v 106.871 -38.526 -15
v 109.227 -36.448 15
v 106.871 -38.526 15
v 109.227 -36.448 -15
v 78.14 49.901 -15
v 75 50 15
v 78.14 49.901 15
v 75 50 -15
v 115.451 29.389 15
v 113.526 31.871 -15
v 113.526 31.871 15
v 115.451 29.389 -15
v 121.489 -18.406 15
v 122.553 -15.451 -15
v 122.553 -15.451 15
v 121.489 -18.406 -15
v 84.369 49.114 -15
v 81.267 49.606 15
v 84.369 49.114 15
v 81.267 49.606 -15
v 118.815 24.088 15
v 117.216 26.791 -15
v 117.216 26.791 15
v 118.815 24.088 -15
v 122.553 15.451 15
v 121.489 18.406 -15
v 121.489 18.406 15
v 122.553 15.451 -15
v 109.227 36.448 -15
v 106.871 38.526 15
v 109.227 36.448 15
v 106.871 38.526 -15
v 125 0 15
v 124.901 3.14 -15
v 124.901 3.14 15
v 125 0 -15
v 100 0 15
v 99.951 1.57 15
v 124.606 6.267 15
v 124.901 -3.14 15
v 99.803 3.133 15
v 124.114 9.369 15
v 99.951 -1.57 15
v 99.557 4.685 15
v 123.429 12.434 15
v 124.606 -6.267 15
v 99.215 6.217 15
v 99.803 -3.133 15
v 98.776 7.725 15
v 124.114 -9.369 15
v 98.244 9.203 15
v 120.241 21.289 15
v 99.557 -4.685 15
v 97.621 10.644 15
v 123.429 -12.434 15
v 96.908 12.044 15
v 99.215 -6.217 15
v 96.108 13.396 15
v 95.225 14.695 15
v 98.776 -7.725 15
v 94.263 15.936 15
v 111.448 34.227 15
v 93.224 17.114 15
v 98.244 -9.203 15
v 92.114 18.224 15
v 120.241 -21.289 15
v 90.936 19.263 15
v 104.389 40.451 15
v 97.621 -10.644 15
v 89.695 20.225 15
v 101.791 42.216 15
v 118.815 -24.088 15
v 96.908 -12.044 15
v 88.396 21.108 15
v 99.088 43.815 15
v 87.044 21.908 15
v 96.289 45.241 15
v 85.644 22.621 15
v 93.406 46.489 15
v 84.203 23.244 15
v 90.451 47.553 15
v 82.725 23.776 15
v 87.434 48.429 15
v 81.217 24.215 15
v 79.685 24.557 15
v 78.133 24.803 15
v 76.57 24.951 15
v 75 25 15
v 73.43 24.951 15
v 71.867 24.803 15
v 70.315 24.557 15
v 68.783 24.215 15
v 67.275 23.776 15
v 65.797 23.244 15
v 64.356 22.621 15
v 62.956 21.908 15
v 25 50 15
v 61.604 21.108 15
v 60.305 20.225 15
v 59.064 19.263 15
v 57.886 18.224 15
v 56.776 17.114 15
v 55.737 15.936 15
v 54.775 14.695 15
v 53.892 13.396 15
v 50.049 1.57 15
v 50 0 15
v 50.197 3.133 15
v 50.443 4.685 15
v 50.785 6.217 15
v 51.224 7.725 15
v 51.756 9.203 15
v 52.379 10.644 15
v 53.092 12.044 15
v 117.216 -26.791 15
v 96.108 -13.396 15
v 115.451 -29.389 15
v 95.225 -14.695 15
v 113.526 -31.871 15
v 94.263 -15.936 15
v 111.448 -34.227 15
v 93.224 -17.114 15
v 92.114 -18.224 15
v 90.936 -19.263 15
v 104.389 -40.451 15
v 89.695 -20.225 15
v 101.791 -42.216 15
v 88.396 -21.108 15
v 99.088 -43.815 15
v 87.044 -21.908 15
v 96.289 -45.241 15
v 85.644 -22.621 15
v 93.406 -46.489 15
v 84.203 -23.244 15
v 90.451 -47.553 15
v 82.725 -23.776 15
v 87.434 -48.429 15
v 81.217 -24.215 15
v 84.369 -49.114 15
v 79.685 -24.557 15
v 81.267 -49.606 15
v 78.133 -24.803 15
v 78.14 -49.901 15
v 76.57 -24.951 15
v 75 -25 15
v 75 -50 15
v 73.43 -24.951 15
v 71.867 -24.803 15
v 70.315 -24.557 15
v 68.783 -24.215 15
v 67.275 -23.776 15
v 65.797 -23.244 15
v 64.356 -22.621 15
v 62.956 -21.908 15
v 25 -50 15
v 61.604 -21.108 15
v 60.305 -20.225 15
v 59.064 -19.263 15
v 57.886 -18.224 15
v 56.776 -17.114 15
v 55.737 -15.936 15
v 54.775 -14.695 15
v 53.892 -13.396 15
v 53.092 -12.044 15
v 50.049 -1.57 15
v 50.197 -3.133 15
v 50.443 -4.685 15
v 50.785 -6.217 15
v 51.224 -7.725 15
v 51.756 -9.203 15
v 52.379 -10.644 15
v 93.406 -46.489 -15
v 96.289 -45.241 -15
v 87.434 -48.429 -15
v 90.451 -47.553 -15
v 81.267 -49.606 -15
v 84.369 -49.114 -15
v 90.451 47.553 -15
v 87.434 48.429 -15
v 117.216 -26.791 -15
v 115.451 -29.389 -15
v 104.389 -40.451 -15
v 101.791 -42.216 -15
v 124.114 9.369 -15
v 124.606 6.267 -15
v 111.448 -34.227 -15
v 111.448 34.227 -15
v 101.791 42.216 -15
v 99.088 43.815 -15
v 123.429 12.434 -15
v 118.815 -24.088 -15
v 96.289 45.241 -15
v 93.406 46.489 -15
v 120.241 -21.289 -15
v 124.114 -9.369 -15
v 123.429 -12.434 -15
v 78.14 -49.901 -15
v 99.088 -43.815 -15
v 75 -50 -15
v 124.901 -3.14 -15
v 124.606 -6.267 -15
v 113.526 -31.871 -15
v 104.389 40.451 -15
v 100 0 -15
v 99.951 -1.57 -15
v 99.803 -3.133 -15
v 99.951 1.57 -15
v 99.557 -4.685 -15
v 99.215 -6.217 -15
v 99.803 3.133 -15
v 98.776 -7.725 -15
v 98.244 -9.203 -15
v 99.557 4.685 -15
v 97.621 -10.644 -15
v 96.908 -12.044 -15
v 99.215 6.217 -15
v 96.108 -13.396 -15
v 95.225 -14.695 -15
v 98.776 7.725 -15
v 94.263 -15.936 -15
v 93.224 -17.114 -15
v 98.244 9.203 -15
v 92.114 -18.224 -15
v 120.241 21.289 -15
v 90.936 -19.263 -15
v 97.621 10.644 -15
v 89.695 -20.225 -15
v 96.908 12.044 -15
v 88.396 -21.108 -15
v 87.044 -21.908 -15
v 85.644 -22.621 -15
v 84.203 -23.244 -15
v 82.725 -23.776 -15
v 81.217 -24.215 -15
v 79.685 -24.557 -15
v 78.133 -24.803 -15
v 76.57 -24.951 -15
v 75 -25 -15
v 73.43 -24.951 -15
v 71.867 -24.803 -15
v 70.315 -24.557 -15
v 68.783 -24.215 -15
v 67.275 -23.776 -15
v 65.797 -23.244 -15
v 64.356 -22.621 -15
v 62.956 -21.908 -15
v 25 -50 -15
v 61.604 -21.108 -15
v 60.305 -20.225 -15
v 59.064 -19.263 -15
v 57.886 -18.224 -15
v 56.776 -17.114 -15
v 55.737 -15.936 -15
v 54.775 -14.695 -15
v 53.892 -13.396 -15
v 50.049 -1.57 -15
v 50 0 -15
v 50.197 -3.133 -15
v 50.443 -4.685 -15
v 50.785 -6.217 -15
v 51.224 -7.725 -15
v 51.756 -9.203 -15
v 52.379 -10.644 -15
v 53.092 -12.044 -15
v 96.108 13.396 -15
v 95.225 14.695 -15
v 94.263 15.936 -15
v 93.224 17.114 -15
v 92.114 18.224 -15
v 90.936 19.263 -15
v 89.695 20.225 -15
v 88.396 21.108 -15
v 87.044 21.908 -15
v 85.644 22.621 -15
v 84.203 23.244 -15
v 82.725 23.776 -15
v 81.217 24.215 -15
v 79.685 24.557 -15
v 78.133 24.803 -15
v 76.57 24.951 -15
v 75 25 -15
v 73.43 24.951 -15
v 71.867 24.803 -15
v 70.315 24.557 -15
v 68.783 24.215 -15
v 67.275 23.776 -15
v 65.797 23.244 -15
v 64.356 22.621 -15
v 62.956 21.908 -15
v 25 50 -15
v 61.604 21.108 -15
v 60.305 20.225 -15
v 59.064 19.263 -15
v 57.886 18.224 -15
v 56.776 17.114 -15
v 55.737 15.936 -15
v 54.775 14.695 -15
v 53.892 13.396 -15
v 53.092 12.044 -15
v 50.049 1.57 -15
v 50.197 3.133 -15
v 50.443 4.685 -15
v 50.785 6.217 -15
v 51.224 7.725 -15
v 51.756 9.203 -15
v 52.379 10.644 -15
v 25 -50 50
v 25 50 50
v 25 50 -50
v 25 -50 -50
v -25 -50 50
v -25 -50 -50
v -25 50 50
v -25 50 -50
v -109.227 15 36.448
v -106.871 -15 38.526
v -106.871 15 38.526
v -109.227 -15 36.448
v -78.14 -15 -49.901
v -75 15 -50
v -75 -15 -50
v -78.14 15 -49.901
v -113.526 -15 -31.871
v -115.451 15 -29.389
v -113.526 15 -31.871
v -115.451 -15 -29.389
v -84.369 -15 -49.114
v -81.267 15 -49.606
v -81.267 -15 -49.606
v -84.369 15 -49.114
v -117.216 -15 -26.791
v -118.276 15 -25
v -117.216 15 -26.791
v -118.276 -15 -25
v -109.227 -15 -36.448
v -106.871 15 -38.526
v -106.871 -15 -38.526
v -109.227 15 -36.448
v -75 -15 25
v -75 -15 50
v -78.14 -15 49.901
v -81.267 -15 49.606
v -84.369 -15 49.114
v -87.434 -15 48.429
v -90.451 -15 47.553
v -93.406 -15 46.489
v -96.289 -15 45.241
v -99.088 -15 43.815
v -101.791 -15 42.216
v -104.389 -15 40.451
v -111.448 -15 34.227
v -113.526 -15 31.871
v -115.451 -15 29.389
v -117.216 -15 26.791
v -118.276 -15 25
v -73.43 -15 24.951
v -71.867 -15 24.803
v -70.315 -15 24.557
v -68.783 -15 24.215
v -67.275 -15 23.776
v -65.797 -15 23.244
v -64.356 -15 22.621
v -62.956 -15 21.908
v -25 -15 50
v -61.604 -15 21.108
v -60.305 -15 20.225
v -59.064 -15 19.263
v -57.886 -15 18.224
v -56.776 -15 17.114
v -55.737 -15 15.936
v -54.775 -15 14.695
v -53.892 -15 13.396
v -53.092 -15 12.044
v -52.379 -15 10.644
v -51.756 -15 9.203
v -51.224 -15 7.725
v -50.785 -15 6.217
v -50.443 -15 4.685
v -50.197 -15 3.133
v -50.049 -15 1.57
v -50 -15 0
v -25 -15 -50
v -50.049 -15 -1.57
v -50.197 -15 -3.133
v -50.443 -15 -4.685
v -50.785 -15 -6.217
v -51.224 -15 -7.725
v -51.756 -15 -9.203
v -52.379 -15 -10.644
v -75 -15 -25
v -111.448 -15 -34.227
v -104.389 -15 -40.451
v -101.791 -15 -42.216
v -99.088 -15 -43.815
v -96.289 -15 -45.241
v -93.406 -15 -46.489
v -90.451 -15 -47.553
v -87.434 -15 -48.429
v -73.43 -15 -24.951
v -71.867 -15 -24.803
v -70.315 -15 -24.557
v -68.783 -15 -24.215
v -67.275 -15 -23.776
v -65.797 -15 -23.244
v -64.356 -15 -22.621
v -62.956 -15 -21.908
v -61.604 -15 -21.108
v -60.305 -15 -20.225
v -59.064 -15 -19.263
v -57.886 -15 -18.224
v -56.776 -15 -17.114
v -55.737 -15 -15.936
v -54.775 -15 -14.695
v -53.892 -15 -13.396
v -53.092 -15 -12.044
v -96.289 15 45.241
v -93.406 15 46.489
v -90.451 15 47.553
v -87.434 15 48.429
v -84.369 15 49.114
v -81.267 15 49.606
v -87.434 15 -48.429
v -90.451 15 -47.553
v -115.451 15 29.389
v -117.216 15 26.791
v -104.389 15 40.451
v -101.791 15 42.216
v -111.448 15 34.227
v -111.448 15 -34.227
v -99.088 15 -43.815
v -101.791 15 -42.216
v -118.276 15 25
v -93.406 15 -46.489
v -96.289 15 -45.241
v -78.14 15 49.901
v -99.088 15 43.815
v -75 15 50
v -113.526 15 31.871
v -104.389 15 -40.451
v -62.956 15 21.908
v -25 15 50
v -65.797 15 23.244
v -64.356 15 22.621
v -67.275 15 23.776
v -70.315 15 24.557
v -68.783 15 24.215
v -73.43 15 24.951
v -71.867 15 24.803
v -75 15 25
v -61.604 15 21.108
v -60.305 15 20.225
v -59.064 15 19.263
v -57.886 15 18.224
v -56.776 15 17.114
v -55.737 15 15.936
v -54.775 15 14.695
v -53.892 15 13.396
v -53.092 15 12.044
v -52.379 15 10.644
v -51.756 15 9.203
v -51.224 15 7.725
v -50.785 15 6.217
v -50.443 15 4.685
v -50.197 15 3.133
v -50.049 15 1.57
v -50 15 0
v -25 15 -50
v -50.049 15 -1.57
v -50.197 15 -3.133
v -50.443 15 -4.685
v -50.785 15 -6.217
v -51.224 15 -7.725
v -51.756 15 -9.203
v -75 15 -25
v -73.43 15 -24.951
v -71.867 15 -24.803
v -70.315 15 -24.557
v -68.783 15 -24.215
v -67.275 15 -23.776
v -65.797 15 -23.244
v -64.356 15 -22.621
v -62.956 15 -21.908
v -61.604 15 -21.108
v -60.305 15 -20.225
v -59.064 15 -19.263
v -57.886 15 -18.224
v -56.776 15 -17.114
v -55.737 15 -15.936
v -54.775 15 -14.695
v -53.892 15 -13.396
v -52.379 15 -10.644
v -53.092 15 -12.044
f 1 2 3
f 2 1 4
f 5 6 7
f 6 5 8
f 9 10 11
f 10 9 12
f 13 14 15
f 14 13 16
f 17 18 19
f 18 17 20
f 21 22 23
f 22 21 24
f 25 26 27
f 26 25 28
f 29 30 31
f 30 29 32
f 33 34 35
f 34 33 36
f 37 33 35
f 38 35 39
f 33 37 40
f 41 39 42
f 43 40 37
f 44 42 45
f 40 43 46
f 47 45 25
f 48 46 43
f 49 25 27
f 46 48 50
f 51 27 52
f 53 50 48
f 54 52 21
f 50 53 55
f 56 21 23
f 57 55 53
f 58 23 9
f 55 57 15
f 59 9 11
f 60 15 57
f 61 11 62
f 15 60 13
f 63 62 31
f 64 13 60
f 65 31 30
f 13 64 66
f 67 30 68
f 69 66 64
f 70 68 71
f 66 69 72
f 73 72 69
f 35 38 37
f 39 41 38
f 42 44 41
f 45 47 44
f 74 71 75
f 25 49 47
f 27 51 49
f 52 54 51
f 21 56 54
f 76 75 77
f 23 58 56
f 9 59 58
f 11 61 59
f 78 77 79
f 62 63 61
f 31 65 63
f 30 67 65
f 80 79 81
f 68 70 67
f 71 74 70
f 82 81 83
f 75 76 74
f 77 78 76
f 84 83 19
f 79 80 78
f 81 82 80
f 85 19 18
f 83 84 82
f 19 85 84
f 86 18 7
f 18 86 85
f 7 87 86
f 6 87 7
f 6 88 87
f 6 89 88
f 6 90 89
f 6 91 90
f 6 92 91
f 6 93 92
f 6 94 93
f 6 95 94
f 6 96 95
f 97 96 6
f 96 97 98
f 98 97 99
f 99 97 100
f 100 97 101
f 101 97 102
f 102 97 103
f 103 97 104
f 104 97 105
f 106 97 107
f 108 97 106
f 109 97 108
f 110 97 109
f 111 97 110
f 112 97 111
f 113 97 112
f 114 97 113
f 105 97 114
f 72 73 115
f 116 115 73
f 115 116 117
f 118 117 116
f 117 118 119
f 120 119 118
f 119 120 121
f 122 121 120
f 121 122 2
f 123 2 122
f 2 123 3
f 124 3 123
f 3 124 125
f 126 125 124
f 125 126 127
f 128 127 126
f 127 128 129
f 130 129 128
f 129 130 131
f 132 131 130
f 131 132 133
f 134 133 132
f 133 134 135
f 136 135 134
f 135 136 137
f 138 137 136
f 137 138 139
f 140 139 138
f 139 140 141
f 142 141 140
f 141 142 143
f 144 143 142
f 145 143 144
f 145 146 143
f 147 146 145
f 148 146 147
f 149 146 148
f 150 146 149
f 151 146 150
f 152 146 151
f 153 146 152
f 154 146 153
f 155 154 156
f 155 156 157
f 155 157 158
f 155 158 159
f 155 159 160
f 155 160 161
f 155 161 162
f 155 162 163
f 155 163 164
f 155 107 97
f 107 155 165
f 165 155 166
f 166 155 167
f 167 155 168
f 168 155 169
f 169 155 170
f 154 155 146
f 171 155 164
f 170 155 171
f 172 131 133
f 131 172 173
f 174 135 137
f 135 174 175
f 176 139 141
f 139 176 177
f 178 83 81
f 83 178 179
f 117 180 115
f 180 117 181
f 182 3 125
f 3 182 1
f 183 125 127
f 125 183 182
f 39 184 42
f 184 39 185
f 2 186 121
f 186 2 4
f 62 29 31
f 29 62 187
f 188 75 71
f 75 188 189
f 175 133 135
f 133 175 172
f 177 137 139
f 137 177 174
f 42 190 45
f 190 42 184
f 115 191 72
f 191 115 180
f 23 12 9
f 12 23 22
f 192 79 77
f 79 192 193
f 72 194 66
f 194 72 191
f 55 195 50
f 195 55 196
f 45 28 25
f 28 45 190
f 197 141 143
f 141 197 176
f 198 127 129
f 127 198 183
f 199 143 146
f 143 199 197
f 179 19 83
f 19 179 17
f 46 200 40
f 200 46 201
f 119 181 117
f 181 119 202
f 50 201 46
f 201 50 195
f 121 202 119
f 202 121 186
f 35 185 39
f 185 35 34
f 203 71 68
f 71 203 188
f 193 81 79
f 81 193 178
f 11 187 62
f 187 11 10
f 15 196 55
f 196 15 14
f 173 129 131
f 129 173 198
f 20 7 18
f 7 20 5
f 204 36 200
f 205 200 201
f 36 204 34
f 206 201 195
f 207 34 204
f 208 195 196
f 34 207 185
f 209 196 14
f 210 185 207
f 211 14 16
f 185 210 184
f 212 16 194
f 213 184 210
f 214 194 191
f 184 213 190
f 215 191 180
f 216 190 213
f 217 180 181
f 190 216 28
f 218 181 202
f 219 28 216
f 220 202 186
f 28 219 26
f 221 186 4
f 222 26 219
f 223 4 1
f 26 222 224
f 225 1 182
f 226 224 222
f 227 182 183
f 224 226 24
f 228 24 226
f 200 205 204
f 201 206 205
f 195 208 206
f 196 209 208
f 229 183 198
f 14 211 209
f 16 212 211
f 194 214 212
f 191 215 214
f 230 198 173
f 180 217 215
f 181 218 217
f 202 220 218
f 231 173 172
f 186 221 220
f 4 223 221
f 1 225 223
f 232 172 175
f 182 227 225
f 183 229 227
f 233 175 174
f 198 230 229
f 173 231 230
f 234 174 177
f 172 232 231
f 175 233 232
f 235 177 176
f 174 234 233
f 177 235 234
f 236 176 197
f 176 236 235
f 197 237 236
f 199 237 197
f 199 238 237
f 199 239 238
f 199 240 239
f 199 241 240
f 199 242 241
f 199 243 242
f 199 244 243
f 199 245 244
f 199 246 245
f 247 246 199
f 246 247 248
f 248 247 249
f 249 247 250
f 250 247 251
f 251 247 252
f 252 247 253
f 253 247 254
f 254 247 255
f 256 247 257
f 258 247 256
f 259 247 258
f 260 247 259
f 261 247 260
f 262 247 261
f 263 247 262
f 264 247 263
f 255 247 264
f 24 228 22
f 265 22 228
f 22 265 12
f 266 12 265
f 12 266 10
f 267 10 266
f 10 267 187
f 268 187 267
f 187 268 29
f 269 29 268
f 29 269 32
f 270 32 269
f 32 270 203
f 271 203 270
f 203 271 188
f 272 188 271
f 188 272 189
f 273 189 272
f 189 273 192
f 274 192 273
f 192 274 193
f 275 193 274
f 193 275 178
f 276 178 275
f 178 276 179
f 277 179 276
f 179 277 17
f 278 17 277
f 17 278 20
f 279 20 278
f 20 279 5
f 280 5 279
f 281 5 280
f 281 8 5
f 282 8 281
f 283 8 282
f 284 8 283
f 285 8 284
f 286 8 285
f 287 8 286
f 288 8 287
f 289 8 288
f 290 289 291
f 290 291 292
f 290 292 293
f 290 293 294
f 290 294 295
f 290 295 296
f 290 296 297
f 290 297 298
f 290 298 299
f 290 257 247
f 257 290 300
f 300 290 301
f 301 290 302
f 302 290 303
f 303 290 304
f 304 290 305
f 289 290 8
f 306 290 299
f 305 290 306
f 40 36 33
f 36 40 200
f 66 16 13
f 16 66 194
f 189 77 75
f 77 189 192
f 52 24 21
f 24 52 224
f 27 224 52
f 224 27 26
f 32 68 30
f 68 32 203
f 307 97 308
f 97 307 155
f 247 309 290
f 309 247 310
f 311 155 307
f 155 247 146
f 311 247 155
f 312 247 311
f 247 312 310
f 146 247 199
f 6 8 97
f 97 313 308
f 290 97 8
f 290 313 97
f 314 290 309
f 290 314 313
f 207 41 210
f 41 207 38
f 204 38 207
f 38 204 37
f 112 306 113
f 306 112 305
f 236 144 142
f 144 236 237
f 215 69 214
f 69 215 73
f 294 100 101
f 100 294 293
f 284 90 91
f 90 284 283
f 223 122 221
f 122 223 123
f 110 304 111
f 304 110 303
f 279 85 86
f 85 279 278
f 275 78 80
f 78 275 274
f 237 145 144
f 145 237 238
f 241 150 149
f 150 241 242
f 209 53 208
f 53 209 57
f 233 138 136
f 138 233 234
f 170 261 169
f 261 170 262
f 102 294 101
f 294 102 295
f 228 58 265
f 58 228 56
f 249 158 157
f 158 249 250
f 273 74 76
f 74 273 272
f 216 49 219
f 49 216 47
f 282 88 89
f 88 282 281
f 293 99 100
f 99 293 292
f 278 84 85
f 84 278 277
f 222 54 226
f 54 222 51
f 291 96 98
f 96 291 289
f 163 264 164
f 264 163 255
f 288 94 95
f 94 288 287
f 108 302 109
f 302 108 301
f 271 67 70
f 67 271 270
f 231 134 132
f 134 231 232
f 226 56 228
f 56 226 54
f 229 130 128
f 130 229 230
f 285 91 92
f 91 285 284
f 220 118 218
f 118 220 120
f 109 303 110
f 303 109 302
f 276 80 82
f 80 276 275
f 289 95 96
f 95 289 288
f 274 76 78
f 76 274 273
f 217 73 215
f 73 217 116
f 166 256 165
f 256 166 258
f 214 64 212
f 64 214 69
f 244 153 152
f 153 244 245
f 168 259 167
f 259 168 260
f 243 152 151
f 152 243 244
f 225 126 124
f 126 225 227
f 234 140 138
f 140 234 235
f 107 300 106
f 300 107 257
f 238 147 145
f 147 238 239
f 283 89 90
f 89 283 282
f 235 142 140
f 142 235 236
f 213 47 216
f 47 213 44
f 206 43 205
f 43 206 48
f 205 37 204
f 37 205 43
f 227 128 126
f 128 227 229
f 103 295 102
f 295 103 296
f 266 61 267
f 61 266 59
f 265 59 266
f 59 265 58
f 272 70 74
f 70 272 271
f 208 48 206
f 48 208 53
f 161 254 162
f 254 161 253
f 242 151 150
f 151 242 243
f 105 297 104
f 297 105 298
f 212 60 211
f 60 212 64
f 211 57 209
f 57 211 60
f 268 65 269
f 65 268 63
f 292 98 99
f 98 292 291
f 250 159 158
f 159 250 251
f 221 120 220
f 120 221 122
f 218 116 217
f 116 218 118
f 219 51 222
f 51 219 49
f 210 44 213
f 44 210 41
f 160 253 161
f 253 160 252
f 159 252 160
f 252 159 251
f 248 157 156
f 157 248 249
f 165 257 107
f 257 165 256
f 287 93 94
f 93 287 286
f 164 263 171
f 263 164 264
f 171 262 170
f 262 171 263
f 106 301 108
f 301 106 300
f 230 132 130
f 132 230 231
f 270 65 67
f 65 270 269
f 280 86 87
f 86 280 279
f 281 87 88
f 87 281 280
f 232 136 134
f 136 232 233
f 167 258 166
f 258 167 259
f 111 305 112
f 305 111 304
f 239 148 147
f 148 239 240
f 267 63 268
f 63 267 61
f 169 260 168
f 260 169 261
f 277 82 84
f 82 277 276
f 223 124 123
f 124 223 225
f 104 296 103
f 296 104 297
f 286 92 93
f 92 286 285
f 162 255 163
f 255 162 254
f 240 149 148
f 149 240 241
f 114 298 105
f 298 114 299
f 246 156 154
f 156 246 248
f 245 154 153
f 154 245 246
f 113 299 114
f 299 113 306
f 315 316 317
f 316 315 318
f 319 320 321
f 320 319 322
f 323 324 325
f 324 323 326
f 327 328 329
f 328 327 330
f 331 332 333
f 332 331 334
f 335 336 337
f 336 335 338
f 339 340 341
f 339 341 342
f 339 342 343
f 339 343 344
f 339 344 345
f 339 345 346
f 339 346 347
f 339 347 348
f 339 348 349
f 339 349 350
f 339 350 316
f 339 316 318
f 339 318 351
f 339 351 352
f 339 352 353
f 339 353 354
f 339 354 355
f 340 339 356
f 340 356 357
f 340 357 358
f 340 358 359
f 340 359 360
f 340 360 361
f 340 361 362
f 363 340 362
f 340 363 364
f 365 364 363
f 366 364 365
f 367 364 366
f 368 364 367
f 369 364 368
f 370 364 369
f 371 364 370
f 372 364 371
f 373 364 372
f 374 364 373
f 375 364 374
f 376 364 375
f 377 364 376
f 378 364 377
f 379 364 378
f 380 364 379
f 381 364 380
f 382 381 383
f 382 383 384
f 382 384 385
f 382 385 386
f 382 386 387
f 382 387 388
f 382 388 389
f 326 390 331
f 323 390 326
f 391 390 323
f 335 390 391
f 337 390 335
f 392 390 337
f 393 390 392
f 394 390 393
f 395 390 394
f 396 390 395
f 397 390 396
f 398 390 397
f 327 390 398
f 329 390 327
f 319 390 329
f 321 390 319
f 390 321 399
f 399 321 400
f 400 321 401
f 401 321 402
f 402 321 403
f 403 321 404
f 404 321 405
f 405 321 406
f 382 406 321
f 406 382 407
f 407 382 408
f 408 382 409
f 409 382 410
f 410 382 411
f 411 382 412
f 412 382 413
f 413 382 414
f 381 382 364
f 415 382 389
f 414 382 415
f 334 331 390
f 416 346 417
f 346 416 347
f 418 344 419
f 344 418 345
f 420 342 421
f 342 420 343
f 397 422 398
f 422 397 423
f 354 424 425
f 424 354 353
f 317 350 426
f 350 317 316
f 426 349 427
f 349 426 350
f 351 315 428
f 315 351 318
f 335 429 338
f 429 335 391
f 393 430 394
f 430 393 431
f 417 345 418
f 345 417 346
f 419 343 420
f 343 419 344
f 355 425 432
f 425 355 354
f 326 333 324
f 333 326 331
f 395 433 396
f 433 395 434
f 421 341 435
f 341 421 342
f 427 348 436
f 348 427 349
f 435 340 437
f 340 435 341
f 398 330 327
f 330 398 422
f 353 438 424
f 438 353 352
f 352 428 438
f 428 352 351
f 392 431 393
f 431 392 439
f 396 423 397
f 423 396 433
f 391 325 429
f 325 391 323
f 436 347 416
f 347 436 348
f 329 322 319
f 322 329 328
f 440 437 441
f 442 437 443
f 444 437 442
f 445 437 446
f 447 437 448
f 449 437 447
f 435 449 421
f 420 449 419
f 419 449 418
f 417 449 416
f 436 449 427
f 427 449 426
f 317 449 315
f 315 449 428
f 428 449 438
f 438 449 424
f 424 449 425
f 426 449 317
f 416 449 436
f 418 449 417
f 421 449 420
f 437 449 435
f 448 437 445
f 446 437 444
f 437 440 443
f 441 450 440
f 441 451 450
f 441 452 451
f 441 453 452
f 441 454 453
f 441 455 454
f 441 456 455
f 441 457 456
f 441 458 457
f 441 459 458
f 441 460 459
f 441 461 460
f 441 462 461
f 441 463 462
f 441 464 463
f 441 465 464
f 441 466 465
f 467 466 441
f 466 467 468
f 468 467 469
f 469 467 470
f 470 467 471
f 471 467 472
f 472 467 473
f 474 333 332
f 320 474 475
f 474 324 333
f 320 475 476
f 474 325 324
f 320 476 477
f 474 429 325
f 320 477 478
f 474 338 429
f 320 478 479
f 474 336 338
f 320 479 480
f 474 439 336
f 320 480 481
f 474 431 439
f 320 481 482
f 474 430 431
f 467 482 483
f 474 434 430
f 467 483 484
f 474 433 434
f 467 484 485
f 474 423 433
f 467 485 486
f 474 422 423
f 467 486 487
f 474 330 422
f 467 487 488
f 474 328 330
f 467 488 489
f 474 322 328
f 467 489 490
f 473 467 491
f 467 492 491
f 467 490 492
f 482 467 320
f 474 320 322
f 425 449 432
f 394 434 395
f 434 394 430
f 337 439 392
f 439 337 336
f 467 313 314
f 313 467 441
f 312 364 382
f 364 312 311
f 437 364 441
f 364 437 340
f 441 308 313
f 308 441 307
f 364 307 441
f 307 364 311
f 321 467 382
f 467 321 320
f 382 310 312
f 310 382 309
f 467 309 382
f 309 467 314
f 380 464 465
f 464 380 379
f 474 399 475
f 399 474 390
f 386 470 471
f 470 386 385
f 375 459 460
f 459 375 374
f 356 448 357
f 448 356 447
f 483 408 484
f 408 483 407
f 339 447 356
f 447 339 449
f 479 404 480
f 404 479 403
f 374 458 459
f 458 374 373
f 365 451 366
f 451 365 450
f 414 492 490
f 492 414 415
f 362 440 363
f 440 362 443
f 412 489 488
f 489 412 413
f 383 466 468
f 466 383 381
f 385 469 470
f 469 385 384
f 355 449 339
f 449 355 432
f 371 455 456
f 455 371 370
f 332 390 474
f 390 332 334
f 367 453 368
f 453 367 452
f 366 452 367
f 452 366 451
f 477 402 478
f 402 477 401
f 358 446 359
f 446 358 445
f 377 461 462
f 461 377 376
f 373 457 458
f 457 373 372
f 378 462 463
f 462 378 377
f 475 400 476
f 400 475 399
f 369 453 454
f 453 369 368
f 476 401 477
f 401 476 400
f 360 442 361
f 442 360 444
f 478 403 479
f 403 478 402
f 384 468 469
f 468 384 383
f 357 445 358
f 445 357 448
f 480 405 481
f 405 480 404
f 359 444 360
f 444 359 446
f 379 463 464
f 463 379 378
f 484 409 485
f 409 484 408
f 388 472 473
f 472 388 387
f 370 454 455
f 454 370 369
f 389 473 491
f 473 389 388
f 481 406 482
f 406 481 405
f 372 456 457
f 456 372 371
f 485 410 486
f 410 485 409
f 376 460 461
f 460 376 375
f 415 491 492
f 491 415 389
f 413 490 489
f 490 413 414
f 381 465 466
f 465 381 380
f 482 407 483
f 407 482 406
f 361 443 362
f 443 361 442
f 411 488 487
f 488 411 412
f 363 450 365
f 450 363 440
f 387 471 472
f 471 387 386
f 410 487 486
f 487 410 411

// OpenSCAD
// file: ../lib.scad
/*
 * Sum all of the elements in a vector.
 */
function sum(x, i = 0) =
     len(x) <= i?0:
     x[i]+sum(x, i + 1);

/*
 * Pop one element off of the front of a list.
 */
function pop(list) =
     assert(len(list)>0)
     len(list)==1?[]:
     [for(i=[1:len(list)-1])
	       list[i]];

/*
 * Return the requrested number of elements off of the front of a list.
 */
// TODO: Take negitive for off of the back.
function take(count,list) =
     count==0?[]:
     [for(i=[0:count-1])
	  if(i>=len(list))
	       undef
	  else
	       list[i]];

/*
 * Count the number of non-undef elements of a list.
 */
function count_defined(list) =
     sum([
      for (e=list)
	   if(e!=undef)
	      1]);
/*
 * Return the first non-undef element, if there is one.
 */
// TODO: This may be faster to return early in the case of large
// lists, how large?
function any(list) =
     [for(e=list)
	 if(e!=undef)
	    e
     ][0];
/*
 * Assert that exactly one element is non-undef and return it.
 */
function unique(list,message="") =
     assert(count_defined(list)==1,message)
     any(list);


X=[1,0,0];
Y=[0,1,0];
Z=[0,0,1];

/*
 * Glue each child onto the outside of the priors.
 *
 * TODO: The outside is currently defined by =hull= and this isn't
 * best.
 *
 * TODO: Make a better name.
 */
module outer_glue()
     for(c=[0:$children-1])
	  difference(){
	       children(c);
	       if(c!=0)
		    for(co=[0:c-1])
			 hull()
			      children(co);}


// This doesn't work because children aren't connected.

module outer_hull(){
     outer_glue(){
	  children();}
     difference(){
	  hull(){
	       outer_glue(){
		    children();}}
	  for(c=[0:$children-1]){
	       hull(){
		    children(c);}}}}



/*
 * Make a pair of an object.
 *
 * @param split The distance to separate the pair.
 *        radius
 *        diameter
 *        r
 *        d
 *
 * @param rot An optional amount to rotate the pair.
 *        theta
 *
 * @param edge Center on the left of the pair rather than the middle.
 *
 * @param mirrored Make the left a mirror of the right instead of a
 *                rotation.
 * @param center The refrence locaiton for the pair.
 */
module pair(split,rot,edge=false,mirrored=true,
     radius,r,diameter,d,theta,center){
     rad=unique([split/2,radius,r,diameter,d/2],
		"Distance required.");
     angle=any([rot,theta,0]);
     module center(){
	  if(edge){
	       translate([abs(rad),0,0]){
		    children();}}
	  else{
	       children();}}
     module flip(){
	  if(mirrored){
	       mirror([1,0,0]){
		    children();}}
	  else{
	       rotate([0,0,180]){
		    children();}}}
     if(center!=undef){
	  translate(center){
	       pair(split,rad,theta=theta){
		    translate(-center){
			 children();}}}}
     else{
	  rotate([0,0,angle]){
	       center(){
		    translate([rad,0,0]){
			 children();}
		    translate([-rad,0,0]){
			 flip(){
			      children();}}}}}}

module xpair(split,rot=0,edge=false){
     pair(split,rot,edge){
	  children();}}
module ypair(split,rot=0,edge=false){
     rotate(90){
	  pair(split,rot,edge){
	       rotate(-90){
		    children();}}}}

module zpair(split,rot=0,edge=false){
     rotate(-90*Y){
	  pair(split,rot,edge){
	       rotate(90*Y){
		    children();}}}}

/*
 * Make a pair but with a middle element.
 *
 * @param split The distance to separate the pair.
 *
 * @param rot An optional amount to rotate the pair.
 */
module tripple(split,rot=0){
     rotate([0,0,90]){
	  children();}
     pair(split,rot){
	  children();}}
/*
 * Make a set of objects in a circle.
 *
 * @param count The number of elements in the circle
 *
 * @param r The radius of the circle.
 */
module set(count,radius,
	   c,r,diameter,d){
     cnt=unique([count,c],
		"Count required.");
     rad=unique([radius,r,diameter/2,d/2],
		"Radius required.");
     for(i=[0:cnt]){
	  rotate([0,0,360/cnt*i]){
	       translate([rad,0,0]){
		    children();}}}}

module grid(directions,times=[2,2]){
     module itter(d,t){
     for(i=[0:t]){
	  translate(d*i){
	       children();}}}
     if(len(directions)==1){
	  itter(directions[0],times[0])children();}
	  else{
	       itter(directions[0],times[0]){
		    grid(pop(directions),pop(times)){
			 children();}}}}

/*
 * A quick rename of translate along z.
 *
 * @param distance The distance to lift by.
 */
function _move(distance)=
     unique([distance],"Distance required.");
function up(distance)=
     _move(distance)*Z;
function down(distance)=
     _move(-distance)*Z;
function right(distance)=
     _move(distance)*Y;
function left(distance)=
     _move(-distance)*Y;
function forward(distance)=
     _move(distance)*X;
function back(distance)=
     _move(-distance)*X;

/*
 * A copy of =cylinder= that is slightly taller so that =difference=
 * doesn't cause graphical glitches.
 */
module wcylinder(h,r,r1,r2,d,d1,d2,center){
     fix_delta=1;
     if(h<0){
	  mirror(Z){
	       wcylinder(h=-h,
			r=r,r1=r1,r2=r2,
			d=d,d1=d1,d2=d2);}}
     else if(center){
	  cylinder(h=h+fix_delta,
		   r=r,r1=r1,r2=r2,
		   d=d,d1=d1,d2=d2,
		   center=true);}
     else{
	  translate(down(fix_delta)){
	       cylinder(h=h+2*fix_delta,
			r=r,r1=r1,r2=r2,
			d=d,d1=d1,d2=d2);}}}

module Cube(size,center=[0,0,0]){
     s=unique([size],"Size required.");
     if(center==true){
	  Cube(s,X+Y+Z);}
     else if(center==false){
	  Cube(s);}
     else if(len(s)==undef){
	  Cube([s,s,s],center);}
     else{
	  if(s[0]<0){
	       assert(center==false || center[0]==0,
		    "Can't center and flip along the same axis.");
	       translate(X*s[0]){
		    Cube([-s[0],s[1],s[2]],center);}}
	  else if(s[1]<0){
	       assert(center==false || center[1]==0,
		      "Can't center and flip along the same axis.");
	       translate(Y*s[1]){
		    Cube([s[0],-s[1],s[2]],center);}}
	  else if(s[2]<0){
	       assert(center==false || center[2]==0,
		      "Can't center and flip along the same axis.");
	       translate(Z*s[2]){
		    Cube([s[0],s[1],-s[2]],center);}}
	  else translate([for(i=[0:2])-1/2*s[i]*center[i]]){
		    cube(s);}}}

/*
 * Mirror the children around a plane.
 */
module Mirror(normalVector,radius=0){
     translate(radius*normalVector){
	  mirror(normalVector){
	       translate(-radius*normalVector){
		    children();}}}}

/*
 * Make a parallelepiped out of three three-vectors.
 */
module parallelepiped(v1,v2,v3)
     hull() // Not sure why this is needed.
	  polyhedron([0*v1,v1,v1+v2,v2,v3,v3+v1,v3+v1+v2,v3+v2],
		     [[0,1,2,3],[4,5,6,7],[0,1,5,4],
		      [3,2,6,7],[0,3,7,4],[1,5,6,2]]);

/*
 * An annulus.
 *
 * @param outer_radius The outer radius.
 *        radius_outer
 *        ro
 *        od
 *
 * @param inner_radius The inner radius.
 *        radius_inner
 *        ri
 *        id
 *
 * @param thickness The height of the annulus.
 *        height
 *        t
 *        h
 *
 * @param center TODO
 *
 * @param theta An optional angle of exclusion.
 *              TODO: Have an inclusion mode.
 *
 * @param cut_tangent If the cut should be tangent to the center cut
 *                    instead of radial.  NOTE: If this is specified
 *                    but theta is not then the internal radius is
 *                    used.
 *
 * @param cut_symmetric If the cut should be symmetric about the X axis.
 */

// TODO: have an optional 2D child to shape the annulus's profile,
// this is in conflict with the radial parameters, as they define the
// shape.
// TODO: Take an opptional second center and make a slot.
module annulus(outer_radius,inner_radius,height,
	       radius_outer,radius_inner,
	       or,ro,od,ir,ri,id,h,thickness,t,center=false,
	       theta,cut_tangent=false,cut_symmetric=false){
     rad_out=unique([outer_radius,radius_outer,or,ro,od/2],
		    "Outer radius required.");
     rad_in=unique([inner_radius,radius_inner,ir,ri,id/2],
		   "Inner radius required.");
     hei=unique([height,h,thickness,t],
		"Height required.");

     module cutter(t,sym=true){
	  if(t>180){
	       assert(cut_tangent==false,
		      "Tangent cuts currently can't be over 180 degrees.");}
	  if(sym && cut_symmetric){
	       cutter(t/2,false);
	       mirror([0,1,0]){
		    cutter(t/2,false);}}
	  else if(t>90){
	       cutter(90,false);
	       rotate(90){
		    cutter(t-90,false);}}
	  else{
	       if(center){
		    translate(down(hei/2)){
			 parallelepiped(hei*[0,0,1],
					rad_out*[1,0,0],
					rad_out*[cos(t),sin(t),0]);}}
	       else{
		    parallelepiped(hei*[0,0,1],
				   rad_out*[1,0,0],
				   rad_out*[cos(t),sin(t),0]);}}}
     // If cut_tangent but no theta, then use the internal radius.
     if((cut_tangent) && (theta==undef)){
	  annulus(ro=rad_out,ri=rad_in,h=hei,center=center,
		  theta=2*asin(rad_in/rad_out),
		  cut_tangent=true,
		  cut_symmetric=cut_symmetric);}
     else if(theta!=undef){
	  difference(){
	       annulus(ro=rad_out,ri=rad_in,h=hei,center=center);
	       if(cut_tangent){
		    hull(){
			 wcylinder(r=rad_in,h=hei,center=center);
			 intersection(){
			      cutter(theta);
			      cylinder(r=rad_out,h=hei,center=center);}}
	       }
	       else{
		    cutter(theta);}}}
     else if(rad_in<0){
	  difference(){
	       cylinder(r=rad_out,h=hei,center=center);
	       wcylinder(r=rad_out+rad_in,h=hei,center=center);}}
     else{
	  difference(){
	       cylinder(r=rad_out,h=hei,center=center);
	       wcylinder(r=rad_in,h=hei,center=center);}}}

/*
 * A rectangle with a circular end.
 *
 * TODO: remake as outer_glue and annulus.
 */
module arch(radius,height,thickness,
	    r,h,t,
	    window_radius,w,ri,
     bottom_edge=false){
     rad=unique([radius,r],
		"Radius required.");
     hei=unique([height,h],
		"Height required.");
     th=unique([thickness,t],
	       "Thickness required.");
     wi=any([window_radius,w,ri]);
     module flip(){
	  if(bottom_edge){
	       translate((hei-rad)*X){
		    rotate(180*Z){
			 children();}}}
	  else{
	       children();}}
     flip(){
	  if(wi){
	       if(wi<0){
		    arch(r=rad,h=hei,t=th,w=r-wi);}
	       else{
		    difference(){
			 arch(r=rad,h=hei,t=th);
			 wcylinder(r=wi,h=th);}}}
	  else{
	       cylinder(r=rad,h=th);
	       translate([0,-rad,0]){
		    cube([hei-rad,2*rad,th]);}}}}


module ramp(length,height,width){
     // assert numbers
     polyhedron([[0,0,0],[length,0,0],[0,0,height],
		 [0,width,0],[length,width,0],[0,width,height]],
		[[2,1,0],[3,4,5],[0,1,4,3],[0,3,5,2],[1,2,5,4]]);}

/*
 * This is an experimental section for dealing with 2d objects
 */
module Square(size,center){
}

module thin(){
     linear_extrude(1/$fn){
	  children();}}

module CircleT(r){
     thin(){
	  circle(r);}}

module loft(){
     for(c=[0:$children-2]){
	  hull(){
	       children(c);
	       children(c+1);}}}

module camshaft(list){
     // assert (len(list)-1)%2=0,"Invalid camshaft.");
     if(len(list)>3){
	  translate(list[1]){
	       camshaft(pop(pop(list)));}
	  camshaft(take(3,list));}
     else if(len(list)==3){
	  //assert [0,2] numbers
	  assert(len(list[1])==3,"Invalid offset.");
	  // TODO: let the faces be more than circles?
	  //       Shapes can't be parameters
	  if(list[1]!=[0,0,0]){ // clip out empty spacers
	       loft(){
		    CircleT(list[0]);
		    translate(list[1]){
			 CircleT(list[2]);}}}}
     else{
	  assert(false,"That's just a cylinder.");}}
// main file
$fn=100;
mm=1; // define units
degrees=1;

use <../lib.scad>;

module example_104(){
     body_thickness=50*mm;
     side_length=100*mm;
     module part_1(){
	  translate([body_thickness/2,0,0]){
	       children();}}
     module part_2(){
	  rotate([90,180,0]){
	       translate([body_thickness/2,0,0]){
		    children();}}}
     module body(){
	  cube([body_thickness,side_length,side_length],center=true);}
     module plate(){
	  thickness=30*mm;
	  translate([side_length/2,0,-thickness/2]){
	       rotate([0,0,180]){
		    arch(side_length/2,side_length,thickness);}}}
     module washer(){
	  pin_hole=25*mm;
	  difference(){
	       plate();
	       translate([side_length/2,0,0]){
		    cylinder(r=pin_hole,h=body_thickness,center=true);}}}
     module claw(){
  	  pin_hole=25*mm;
	  difference(){
	       plate();
	       translate([side_length/2,0,0]){
		    hull(){
			 cylinder(r=pin_hole,h=body_thickness,center=true);
			 translate([body_thickness,0,0]){
			      cylinder(r=pin_hole,h=body_thickness,center=true);}}}}}
     union(){
	  body();
	  part_1() washer();
	  part_2() claw();}}

example_104();
